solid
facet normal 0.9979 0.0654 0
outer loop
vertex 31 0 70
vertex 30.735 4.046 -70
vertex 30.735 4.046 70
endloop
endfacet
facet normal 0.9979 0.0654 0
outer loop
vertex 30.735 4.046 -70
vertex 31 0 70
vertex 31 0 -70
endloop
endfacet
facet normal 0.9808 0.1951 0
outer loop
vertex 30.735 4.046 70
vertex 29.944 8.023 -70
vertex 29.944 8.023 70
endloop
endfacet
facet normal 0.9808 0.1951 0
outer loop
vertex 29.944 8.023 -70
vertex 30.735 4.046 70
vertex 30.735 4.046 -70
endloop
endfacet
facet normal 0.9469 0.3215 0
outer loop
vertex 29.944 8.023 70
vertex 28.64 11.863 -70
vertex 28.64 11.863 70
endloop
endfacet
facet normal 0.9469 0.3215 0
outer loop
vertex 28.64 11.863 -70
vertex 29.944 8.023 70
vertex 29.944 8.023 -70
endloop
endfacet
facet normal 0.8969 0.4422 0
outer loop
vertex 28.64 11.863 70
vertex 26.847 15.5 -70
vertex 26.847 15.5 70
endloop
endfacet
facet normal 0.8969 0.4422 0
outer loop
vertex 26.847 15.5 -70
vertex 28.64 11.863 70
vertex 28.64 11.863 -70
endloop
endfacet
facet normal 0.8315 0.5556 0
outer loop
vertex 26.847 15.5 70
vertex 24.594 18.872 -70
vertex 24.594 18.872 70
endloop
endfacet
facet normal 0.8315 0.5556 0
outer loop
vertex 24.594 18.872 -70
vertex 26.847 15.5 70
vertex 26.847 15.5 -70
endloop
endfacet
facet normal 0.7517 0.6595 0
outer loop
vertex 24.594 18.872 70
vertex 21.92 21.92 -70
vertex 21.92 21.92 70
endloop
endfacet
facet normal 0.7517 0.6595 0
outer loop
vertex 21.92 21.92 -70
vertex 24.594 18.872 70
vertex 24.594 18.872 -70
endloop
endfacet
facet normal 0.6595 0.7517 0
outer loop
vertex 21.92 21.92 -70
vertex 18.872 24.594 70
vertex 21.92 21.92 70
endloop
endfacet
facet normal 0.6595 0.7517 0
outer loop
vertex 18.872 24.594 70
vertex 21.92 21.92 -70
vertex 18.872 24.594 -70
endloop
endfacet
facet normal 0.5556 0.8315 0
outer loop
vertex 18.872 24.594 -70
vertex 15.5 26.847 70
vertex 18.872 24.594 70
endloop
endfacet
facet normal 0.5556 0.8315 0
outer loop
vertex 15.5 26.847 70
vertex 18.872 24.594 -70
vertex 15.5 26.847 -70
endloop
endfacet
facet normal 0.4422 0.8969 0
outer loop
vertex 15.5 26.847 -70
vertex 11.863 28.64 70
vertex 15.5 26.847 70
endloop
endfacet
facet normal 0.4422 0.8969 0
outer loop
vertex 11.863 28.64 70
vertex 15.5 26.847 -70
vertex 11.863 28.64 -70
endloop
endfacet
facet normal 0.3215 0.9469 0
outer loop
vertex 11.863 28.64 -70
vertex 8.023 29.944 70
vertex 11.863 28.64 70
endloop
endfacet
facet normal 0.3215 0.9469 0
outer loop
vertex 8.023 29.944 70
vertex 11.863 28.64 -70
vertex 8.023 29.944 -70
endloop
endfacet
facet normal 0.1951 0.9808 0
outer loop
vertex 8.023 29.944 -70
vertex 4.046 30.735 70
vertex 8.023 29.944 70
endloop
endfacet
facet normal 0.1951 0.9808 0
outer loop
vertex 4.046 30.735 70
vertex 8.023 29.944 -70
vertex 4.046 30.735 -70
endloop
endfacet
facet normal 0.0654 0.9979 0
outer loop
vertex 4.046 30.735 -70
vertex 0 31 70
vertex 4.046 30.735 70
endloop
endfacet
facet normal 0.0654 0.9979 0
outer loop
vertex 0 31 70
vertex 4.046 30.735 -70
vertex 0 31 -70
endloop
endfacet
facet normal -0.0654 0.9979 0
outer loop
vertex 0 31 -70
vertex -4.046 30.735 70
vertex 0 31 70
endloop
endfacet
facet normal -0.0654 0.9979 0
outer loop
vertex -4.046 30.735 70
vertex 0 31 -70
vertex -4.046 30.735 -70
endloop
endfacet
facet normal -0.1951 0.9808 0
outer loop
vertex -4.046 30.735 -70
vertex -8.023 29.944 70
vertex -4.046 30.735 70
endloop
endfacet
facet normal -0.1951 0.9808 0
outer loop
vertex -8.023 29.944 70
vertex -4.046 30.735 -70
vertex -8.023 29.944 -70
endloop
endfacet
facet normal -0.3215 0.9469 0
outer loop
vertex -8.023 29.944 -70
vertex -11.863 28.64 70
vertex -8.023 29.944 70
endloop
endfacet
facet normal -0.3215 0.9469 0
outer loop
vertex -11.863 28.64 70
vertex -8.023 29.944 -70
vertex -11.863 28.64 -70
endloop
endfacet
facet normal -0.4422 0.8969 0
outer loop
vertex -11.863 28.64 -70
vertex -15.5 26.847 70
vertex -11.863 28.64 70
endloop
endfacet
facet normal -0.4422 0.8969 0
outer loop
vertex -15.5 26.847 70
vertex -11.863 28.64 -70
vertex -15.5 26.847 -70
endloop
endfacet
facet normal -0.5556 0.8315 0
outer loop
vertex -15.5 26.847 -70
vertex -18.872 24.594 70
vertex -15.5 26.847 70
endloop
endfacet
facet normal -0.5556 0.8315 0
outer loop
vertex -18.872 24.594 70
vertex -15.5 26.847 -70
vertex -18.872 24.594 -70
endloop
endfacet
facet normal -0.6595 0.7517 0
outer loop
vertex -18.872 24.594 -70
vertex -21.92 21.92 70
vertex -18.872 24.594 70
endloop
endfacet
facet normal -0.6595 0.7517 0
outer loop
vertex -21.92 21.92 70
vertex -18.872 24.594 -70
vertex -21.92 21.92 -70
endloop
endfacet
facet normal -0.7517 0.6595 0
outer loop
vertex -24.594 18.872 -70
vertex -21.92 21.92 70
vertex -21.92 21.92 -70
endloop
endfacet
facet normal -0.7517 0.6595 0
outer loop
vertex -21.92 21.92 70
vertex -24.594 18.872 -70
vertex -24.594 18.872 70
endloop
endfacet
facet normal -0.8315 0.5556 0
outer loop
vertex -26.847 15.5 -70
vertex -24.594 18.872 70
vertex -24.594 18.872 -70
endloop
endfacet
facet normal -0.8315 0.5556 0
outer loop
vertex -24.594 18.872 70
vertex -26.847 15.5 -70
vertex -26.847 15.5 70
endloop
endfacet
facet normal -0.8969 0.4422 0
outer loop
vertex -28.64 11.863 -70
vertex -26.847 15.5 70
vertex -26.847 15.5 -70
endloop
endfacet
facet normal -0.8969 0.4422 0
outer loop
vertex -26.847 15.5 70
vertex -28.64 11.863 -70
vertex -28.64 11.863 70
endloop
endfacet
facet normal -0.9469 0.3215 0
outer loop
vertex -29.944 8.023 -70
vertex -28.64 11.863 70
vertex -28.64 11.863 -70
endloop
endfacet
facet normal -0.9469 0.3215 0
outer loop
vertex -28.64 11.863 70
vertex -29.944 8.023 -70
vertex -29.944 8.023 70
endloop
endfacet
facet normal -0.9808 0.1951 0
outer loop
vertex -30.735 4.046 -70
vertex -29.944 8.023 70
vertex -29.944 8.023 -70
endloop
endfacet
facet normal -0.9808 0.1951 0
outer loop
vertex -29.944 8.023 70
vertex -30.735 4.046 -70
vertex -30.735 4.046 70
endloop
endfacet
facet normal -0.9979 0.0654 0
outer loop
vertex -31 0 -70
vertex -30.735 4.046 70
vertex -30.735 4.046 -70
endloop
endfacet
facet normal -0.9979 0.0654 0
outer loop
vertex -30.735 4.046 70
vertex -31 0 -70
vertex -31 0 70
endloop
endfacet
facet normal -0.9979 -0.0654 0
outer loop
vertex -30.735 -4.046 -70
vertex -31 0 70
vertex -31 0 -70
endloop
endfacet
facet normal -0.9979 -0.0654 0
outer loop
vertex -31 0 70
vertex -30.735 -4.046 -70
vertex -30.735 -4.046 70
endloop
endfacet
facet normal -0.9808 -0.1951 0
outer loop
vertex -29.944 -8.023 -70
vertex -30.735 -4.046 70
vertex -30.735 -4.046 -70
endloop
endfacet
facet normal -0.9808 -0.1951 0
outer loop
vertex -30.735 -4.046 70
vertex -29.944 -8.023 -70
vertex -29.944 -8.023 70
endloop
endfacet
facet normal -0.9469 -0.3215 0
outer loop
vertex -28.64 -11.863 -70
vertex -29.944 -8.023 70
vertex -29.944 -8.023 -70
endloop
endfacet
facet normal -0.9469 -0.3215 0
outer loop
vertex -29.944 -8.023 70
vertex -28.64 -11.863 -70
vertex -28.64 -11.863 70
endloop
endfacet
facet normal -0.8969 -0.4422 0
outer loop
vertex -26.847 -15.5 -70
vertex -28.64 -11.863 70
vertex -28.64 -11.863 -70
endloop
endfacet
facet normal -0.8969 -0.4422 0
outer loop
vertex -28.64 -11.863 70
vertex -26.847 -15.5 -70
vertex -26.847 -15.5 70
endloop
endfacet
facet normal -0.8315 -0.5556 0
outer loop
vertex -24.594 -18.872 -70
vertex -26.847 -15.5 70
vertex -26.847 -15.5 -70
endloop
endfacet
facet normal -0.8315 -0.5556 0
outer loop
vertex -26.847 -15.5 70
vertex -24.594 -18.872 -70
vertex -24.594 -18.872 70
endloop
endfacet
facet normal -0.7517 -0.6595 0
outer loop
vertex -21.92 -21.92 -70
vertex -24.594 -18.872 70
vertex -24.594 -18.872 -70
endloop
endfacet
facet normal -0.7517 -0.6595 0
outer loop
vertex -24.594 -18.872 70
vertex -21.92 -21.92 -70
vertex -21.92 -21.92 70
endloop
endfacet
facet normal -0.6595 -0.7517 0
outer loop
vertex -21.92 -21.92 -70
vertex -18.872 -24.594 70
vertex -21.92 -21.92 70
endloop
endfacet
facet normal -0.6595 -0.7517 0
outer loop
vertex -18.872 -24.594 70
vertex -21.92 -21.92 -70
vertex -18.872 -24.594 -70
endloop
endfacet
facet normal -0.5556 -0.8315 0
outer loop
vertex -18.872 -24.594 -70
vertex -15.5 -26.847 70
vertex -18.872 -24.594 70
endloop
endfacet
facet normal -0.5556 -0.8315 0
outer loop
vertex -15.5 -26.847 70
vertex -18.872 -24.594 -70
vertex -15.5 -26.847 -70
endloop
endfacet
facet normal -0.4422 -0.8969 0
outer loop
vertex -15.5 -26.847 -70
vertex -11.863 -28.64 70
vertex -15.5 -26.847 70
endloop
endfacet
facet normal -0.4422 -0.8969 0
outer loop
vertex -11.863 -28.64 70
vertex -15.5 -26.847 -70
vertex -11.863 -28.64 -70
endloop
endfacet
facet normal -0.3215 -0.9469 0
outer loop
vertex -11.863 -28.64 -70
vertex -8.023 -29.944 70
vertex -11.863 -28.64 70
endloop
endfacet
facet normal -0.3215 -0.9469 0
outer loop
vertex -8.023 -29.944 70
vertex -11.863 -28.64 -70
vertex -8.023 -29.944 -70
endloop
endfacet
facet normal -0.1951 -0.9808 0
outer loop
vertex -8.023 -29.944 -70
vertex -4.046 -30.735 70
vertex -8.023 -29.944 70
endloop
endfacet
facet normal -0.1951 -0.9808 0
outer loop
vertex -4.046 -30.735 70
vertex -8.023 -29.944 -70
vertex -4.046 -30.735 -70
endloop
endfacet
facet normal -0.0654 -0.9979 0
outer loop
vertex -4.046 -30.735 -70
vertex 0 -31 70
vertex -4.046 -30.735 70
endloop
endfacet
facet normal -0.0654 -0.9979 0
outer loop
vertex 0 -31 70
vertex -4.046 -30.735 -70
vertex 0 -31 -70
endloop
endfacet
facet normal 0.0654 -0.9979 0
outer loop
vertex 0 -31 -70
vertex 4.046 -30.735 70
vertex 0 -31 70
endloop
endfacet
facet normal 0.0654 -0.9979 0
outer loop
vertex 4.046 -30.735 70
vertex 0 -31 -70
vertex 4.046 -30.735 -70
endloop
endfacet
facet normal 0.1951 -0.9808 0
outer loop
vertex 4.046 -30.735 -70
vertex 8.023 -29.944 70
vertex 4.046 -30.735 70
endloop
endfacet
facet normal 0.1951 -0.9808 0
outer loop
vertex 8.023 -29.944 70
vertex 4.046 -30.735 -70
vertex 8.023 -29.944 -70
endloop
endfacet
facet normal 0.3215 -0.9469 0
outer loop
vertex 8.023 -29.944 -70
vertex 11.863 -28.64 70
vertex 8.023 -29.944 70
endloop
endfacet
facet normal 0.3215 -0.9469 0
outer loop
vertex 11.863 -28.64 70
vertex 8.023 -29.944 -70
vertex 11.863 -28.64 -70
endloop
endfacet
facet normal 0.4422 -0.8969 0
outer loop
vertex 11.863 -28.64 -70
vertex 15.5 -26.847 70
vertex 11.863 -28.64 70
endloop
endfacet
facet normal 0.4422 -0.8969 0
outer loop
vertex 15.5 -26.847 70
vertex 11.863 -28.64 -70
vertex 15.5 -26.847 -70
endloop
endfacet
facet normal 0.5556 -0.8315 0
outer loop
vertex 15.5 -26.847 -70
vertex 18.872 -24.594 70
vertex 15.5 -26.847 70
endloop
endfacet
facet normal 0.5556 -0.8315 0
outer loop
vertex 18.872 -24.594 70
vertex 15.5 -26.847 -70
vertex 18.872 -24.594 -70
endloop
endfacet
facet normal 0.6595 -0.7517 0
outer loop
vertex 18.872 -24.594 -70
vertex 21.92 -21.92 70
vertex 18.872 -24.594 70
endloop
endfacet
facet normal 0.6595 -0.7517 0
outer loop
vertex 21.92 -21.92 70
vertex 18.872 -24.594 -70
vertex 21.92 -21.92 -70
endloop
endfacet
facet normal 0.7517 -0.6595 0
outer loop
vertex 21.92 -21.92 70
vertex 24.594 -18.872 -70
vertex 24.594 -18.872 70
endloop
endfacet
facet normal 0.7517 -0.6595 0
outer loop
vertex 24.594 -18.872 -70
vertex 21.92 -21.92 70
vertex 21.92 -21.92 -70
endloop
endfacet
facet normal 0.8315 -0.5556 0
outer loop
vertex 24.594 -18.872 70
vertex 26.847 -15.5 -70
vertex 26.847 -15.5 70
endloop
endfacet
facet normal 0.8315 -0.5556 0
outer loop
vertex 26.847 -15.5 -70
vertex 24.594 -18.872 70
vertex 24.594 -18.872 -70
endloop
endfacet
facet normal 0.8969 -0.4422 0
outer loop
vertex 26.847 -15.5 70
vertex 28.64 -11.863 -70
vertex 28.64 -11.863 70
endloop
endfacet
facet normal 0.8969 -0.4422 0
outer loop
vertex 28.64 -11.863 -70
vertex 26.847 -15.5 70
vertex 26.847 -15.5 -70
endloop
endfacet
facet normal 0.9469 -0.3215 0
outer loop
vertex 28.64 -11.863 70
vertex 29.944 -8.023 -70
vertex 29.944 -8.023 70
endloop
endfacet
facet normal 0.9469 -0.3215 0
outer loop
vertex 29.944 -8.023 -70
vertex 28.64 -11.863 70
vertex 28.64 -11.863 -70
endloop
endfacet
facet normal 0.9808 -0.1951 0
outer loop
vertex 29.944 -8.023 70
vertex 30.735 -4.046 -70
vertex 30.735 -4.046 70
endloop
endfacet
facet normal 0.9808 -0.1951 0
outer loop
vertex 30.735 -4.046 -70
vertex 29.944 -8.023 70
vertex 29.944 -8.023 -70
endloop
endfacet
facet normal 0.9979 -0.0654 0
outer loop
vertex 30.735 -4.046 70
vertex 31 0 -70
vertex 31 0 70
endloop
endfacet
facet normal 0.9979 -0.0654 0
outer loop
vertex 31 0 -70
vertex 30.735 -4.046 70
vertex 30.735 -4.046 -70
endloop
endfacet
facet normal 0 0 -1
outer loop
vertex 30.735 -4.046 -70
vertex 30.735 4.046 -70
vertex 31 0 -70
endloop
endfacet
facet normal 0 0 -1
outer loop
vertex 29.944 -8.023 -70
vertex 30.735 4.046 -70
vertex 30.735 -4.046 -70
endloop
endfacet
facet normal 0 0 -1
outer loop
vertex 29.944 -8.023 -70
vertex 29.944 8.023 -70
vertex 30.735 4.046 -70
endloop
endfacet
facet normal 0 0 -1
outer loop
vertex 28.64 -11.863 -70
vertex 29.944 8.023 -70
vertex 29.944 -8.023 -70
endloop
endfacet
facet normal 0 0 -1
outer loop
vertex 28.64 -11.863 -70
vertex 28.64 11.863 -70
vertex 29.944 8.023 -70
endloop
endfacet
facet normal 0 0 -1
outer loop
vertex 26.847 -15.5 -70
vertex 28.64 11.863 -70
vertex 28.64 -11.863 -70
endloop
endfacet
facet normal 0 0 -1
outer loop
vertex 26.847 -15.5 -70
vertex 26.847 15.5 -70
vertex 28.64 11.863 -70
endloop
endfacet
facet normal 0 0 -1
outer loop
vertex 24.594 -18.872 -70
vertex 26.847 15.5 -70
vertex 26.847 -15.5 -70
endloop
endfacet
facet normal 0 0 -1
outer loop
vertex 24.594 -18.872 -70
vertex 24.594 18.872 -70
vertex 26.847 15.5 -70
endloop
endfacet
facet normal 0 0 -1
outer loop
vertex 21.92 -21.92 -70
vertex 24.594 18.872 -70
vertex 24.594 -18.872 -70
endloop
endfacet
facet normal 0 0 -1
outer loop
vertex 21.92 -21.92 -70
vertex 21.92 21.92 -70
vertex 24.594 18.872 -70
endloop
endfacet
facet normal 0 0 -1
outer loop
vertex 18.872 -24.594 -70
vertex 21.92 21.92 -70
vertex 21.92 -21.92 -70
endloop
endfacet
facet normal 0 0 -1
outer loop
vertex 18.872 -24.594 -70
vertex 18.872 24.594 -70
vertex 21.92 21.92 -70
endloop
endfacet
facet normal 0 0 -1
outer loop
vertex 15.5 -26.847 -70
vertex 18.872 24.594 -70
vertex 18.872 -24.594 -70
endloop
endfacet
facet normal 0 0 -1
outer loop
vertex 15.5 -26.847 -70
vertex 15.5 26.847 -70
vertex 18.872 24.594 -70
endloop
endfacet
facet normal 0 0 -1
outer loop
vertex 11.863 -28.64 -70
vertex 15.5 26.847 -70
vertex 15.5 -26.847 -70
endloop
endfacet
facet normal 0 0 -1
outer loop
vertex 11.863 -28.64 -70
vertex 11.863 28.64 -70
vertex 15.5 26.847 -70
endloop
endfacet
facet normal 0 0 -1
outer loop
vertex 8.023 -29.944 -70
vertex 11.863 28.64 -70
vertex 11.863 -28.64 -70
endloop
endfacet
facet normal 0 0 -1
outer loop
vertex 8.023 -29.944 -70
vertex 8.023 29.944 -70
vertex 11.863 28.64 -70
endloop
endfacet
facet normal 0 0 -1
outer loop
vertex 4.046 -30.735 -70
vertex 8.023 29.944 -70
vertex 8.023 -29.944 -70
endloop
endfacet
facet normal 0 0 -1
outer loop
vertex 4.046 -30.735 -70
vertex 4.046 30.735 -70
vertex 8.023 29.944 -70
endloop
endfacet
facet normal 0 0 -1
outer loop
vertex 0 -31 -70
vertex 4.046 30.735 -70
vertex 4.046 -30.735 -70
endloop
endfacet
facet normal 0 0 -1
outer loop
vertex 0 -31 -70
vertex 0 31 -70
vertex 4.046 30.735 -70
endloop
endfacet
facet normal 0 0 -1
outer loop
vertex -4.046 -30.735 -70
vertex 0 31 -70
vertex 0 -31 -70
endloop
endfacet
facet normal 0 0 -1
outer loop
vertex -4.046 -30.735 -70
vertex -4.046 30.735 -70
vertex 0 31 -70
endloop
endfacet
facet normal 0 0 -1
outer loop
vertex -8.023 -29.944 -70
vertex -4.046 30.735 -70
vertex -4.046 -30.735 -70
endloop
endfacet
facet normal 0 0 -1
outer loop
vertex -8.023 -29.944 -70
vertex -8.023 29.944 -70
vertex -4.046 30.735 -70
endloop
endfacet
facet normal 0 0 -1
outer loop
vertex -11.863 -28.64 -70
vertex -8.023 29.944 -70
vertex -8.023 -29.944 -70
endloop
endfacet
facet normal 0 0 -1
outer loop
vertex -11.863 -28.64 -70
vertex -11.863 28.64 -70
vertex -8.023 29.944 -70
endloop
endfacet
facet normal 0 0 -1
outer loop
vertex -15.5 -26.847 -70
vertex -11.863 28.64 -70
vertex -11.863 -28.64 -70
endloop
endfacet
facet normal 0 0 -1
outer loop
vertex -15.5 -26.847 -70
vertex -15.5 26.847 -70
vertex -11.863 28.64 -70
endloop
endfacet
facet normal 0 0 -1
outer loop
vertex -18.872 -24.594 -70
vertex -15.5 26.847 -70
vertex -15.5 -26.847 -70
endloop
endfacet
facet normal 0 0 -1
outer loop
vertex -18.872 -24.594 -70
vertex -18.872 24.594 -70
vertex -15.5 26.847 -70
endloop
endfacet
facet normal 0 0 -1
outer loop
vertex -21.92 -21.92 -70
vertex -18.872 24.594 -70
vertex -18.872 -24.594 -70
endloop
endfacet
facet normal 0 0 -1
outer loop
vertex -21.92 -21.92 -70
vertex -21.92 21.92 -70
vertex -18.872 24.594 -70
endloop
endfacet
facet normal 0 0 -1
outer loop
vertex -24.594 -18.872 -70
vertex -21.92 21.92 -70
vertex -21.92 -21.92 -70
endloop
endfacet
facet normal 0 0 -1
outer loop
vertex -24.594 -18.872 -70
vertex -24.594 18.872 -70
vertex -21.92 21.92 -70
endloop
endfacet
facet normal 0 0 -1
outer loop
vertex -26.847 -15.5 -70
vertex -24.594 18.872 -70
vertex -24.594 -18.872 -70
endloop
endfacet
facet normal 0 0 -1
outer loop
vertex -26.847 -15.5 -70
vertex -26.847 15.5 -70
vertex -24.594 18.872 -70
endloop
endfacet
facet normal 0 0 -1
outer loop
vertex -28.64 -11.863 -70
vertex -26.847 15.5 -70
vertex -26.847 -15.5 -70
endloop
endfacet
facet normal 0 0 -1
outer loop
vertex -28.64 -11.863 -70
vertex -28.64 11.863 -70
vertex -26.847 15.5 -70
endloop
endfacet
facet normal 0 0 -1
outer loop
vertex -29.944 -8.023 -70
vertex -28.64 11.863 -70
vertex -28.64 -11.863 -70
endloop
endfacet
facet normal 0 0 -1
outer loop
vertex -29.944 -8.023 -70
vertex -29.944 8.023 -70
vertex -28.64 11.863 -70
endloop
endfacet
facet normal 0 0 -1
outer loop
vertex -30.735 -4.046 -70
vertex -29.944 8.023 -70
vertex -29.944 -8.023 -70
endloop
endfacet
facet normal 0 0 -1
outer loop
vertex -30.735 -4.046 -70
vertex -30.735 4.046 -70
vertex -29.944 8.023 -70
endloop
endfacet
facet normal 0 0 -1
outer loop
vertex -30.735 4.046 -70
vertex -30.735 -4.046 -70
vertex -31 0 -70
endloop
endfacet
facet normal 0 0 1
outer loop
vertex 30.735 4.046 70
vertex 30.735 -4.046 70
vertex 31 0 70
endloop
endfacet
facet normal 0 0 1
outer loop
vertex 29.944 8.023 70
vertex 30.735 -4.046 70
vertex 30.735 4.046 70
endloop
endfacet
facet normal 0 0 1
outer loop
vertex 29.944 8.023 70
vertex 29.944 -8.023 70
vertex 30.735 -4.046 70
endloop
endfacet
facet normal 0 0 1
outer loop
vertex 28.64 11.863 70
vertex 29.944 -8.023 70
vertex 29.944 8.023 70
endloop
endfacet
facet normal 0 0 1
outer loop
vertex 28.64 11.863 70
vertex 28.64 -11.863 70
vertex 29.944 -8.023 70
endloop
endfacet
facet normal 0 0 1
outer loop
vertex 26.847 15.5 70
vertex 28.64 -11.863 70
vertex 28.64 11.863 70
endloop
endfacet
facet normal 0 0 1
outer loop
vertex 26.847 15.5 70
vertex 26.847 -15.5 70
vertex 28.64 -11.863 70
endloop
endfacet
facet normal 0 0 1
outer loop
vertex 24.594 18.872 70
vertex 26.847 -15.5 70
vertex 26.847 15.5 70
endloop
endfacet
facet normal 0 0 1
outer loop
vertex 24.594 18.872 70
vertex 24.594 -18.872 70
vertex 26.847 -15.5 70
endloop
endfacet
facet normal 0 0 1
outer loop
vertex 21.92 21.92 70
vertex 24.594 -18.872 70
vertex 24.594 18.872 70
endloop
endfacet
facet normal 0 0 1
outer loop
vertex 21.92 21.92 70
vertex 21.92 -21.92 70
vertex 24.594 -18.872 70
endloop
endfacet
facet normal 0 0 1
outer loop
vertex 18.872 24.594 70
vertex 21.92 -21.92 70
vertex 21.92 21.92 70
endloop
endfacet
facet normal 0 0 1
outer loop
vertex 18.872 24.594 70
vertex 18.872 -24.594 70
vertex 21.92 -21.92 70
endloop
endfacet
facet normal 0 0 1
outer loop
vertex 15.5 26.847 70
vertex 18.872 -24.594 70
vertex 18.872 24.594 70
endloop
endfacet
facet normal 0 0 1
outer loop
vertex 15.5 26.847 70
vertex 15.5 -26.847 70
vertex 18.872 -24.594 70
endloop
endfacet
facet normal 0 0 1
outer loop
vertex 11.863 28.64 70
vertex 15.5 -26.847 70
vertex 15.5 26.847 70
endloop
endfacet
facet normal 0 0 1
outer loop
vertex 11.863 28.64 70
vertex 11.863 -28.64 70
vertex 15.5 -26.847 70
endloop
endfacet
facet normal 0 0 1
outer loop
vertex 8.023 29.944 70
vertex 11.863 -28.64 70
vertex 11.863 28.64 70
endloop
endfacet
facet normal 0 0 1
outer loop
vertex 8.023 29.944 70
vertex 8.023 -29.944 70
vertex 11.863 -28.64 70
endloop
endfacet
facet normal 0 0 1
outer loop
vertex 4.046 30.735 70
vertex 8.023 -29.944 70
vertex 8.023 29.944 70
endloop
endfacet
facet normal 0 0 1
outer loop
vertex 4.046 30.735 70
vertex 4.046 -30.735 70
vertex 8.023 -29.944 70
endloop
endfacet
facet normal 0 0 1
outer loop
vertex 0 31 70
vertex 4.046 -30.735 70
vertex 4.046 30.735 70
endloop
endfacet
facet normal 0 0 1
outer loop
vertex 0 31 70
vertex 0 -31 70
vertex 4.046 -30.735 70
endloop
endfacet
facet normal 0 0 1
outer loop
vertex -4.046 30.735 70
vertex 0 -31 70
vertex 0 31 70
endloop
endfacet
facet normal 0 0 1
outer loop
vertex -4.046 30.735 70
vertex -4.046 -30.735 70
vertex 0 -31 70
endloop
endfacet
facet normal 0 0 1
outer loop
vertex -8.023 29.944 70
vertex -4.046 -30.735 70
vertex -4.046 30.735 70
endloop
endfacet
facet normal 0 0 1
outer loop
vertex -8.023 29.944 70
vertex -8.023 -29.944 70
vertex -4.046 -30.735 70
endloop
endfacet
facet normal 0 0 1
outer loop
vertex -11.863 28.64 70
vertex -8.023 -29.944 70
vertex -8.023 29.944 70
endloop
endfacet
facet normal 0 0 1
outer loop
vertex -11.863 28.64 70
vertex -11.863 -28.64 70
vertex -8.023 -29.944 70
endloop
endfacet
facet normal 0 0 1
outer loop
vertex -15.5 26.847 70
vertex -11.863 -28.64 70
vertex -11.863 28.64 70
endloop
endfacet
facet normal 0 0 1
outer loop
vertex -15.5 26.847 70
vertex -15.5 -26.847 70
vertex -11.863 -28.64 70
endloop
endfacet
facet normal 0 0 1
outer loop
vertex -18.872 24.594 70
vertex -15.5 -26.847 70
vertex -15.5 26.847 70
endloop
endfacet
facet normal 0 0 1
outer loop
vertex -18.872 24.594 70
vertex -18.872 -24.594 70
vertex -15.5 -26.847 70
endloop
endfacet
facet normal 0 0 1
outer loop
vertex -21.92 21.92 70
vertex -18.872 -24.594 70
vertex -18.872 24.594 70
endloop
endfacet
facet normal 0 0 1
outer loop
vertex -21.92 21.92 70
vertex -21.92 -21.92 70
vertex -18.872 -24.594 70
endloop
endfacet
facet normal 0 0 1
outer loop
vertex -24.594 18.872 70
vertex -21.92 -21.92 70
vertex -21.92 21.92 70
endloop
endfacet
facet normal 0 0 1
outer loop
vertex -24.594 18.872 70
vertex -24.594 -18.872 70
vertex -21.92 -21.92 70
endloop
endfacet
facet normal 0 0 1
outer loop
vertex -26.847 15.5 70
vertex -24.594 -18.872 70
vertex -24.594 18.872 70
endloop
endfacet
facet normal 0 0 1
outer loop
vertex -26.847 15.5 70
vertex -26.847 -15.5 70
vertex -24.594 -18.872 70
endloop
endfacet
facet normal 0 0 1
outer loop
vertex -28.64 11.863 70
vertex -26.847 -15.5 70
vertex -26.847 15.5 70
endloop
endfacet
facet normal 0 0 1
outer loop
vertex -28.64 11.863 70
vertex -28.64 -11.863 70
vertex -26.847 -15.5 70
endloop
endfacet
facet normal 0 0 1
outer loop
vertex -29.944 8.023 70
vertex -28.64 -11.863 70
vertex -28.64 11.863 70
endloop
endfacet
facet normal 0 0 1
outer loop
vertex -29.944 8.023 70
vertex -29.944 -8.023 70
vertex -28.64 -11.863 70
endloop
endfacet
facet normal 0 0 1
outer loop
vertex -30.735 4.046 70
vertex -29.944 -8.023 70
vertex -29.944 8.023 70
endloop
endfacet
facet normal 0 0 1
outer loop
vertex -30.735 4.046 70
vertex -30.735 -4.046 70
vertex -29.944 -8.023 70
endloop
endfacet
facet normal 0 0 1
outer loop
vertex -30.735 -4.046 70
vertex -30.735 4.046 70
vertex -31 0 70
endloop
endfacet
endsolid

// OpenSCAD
// ========================================
// a cylinder with radius 31 mm and height 140 mm
// NeuroCAD canonical IR; dimensions are millimetres
// ========================================
$fn = 48;

cylinder(r=31, h=140, center=true);
